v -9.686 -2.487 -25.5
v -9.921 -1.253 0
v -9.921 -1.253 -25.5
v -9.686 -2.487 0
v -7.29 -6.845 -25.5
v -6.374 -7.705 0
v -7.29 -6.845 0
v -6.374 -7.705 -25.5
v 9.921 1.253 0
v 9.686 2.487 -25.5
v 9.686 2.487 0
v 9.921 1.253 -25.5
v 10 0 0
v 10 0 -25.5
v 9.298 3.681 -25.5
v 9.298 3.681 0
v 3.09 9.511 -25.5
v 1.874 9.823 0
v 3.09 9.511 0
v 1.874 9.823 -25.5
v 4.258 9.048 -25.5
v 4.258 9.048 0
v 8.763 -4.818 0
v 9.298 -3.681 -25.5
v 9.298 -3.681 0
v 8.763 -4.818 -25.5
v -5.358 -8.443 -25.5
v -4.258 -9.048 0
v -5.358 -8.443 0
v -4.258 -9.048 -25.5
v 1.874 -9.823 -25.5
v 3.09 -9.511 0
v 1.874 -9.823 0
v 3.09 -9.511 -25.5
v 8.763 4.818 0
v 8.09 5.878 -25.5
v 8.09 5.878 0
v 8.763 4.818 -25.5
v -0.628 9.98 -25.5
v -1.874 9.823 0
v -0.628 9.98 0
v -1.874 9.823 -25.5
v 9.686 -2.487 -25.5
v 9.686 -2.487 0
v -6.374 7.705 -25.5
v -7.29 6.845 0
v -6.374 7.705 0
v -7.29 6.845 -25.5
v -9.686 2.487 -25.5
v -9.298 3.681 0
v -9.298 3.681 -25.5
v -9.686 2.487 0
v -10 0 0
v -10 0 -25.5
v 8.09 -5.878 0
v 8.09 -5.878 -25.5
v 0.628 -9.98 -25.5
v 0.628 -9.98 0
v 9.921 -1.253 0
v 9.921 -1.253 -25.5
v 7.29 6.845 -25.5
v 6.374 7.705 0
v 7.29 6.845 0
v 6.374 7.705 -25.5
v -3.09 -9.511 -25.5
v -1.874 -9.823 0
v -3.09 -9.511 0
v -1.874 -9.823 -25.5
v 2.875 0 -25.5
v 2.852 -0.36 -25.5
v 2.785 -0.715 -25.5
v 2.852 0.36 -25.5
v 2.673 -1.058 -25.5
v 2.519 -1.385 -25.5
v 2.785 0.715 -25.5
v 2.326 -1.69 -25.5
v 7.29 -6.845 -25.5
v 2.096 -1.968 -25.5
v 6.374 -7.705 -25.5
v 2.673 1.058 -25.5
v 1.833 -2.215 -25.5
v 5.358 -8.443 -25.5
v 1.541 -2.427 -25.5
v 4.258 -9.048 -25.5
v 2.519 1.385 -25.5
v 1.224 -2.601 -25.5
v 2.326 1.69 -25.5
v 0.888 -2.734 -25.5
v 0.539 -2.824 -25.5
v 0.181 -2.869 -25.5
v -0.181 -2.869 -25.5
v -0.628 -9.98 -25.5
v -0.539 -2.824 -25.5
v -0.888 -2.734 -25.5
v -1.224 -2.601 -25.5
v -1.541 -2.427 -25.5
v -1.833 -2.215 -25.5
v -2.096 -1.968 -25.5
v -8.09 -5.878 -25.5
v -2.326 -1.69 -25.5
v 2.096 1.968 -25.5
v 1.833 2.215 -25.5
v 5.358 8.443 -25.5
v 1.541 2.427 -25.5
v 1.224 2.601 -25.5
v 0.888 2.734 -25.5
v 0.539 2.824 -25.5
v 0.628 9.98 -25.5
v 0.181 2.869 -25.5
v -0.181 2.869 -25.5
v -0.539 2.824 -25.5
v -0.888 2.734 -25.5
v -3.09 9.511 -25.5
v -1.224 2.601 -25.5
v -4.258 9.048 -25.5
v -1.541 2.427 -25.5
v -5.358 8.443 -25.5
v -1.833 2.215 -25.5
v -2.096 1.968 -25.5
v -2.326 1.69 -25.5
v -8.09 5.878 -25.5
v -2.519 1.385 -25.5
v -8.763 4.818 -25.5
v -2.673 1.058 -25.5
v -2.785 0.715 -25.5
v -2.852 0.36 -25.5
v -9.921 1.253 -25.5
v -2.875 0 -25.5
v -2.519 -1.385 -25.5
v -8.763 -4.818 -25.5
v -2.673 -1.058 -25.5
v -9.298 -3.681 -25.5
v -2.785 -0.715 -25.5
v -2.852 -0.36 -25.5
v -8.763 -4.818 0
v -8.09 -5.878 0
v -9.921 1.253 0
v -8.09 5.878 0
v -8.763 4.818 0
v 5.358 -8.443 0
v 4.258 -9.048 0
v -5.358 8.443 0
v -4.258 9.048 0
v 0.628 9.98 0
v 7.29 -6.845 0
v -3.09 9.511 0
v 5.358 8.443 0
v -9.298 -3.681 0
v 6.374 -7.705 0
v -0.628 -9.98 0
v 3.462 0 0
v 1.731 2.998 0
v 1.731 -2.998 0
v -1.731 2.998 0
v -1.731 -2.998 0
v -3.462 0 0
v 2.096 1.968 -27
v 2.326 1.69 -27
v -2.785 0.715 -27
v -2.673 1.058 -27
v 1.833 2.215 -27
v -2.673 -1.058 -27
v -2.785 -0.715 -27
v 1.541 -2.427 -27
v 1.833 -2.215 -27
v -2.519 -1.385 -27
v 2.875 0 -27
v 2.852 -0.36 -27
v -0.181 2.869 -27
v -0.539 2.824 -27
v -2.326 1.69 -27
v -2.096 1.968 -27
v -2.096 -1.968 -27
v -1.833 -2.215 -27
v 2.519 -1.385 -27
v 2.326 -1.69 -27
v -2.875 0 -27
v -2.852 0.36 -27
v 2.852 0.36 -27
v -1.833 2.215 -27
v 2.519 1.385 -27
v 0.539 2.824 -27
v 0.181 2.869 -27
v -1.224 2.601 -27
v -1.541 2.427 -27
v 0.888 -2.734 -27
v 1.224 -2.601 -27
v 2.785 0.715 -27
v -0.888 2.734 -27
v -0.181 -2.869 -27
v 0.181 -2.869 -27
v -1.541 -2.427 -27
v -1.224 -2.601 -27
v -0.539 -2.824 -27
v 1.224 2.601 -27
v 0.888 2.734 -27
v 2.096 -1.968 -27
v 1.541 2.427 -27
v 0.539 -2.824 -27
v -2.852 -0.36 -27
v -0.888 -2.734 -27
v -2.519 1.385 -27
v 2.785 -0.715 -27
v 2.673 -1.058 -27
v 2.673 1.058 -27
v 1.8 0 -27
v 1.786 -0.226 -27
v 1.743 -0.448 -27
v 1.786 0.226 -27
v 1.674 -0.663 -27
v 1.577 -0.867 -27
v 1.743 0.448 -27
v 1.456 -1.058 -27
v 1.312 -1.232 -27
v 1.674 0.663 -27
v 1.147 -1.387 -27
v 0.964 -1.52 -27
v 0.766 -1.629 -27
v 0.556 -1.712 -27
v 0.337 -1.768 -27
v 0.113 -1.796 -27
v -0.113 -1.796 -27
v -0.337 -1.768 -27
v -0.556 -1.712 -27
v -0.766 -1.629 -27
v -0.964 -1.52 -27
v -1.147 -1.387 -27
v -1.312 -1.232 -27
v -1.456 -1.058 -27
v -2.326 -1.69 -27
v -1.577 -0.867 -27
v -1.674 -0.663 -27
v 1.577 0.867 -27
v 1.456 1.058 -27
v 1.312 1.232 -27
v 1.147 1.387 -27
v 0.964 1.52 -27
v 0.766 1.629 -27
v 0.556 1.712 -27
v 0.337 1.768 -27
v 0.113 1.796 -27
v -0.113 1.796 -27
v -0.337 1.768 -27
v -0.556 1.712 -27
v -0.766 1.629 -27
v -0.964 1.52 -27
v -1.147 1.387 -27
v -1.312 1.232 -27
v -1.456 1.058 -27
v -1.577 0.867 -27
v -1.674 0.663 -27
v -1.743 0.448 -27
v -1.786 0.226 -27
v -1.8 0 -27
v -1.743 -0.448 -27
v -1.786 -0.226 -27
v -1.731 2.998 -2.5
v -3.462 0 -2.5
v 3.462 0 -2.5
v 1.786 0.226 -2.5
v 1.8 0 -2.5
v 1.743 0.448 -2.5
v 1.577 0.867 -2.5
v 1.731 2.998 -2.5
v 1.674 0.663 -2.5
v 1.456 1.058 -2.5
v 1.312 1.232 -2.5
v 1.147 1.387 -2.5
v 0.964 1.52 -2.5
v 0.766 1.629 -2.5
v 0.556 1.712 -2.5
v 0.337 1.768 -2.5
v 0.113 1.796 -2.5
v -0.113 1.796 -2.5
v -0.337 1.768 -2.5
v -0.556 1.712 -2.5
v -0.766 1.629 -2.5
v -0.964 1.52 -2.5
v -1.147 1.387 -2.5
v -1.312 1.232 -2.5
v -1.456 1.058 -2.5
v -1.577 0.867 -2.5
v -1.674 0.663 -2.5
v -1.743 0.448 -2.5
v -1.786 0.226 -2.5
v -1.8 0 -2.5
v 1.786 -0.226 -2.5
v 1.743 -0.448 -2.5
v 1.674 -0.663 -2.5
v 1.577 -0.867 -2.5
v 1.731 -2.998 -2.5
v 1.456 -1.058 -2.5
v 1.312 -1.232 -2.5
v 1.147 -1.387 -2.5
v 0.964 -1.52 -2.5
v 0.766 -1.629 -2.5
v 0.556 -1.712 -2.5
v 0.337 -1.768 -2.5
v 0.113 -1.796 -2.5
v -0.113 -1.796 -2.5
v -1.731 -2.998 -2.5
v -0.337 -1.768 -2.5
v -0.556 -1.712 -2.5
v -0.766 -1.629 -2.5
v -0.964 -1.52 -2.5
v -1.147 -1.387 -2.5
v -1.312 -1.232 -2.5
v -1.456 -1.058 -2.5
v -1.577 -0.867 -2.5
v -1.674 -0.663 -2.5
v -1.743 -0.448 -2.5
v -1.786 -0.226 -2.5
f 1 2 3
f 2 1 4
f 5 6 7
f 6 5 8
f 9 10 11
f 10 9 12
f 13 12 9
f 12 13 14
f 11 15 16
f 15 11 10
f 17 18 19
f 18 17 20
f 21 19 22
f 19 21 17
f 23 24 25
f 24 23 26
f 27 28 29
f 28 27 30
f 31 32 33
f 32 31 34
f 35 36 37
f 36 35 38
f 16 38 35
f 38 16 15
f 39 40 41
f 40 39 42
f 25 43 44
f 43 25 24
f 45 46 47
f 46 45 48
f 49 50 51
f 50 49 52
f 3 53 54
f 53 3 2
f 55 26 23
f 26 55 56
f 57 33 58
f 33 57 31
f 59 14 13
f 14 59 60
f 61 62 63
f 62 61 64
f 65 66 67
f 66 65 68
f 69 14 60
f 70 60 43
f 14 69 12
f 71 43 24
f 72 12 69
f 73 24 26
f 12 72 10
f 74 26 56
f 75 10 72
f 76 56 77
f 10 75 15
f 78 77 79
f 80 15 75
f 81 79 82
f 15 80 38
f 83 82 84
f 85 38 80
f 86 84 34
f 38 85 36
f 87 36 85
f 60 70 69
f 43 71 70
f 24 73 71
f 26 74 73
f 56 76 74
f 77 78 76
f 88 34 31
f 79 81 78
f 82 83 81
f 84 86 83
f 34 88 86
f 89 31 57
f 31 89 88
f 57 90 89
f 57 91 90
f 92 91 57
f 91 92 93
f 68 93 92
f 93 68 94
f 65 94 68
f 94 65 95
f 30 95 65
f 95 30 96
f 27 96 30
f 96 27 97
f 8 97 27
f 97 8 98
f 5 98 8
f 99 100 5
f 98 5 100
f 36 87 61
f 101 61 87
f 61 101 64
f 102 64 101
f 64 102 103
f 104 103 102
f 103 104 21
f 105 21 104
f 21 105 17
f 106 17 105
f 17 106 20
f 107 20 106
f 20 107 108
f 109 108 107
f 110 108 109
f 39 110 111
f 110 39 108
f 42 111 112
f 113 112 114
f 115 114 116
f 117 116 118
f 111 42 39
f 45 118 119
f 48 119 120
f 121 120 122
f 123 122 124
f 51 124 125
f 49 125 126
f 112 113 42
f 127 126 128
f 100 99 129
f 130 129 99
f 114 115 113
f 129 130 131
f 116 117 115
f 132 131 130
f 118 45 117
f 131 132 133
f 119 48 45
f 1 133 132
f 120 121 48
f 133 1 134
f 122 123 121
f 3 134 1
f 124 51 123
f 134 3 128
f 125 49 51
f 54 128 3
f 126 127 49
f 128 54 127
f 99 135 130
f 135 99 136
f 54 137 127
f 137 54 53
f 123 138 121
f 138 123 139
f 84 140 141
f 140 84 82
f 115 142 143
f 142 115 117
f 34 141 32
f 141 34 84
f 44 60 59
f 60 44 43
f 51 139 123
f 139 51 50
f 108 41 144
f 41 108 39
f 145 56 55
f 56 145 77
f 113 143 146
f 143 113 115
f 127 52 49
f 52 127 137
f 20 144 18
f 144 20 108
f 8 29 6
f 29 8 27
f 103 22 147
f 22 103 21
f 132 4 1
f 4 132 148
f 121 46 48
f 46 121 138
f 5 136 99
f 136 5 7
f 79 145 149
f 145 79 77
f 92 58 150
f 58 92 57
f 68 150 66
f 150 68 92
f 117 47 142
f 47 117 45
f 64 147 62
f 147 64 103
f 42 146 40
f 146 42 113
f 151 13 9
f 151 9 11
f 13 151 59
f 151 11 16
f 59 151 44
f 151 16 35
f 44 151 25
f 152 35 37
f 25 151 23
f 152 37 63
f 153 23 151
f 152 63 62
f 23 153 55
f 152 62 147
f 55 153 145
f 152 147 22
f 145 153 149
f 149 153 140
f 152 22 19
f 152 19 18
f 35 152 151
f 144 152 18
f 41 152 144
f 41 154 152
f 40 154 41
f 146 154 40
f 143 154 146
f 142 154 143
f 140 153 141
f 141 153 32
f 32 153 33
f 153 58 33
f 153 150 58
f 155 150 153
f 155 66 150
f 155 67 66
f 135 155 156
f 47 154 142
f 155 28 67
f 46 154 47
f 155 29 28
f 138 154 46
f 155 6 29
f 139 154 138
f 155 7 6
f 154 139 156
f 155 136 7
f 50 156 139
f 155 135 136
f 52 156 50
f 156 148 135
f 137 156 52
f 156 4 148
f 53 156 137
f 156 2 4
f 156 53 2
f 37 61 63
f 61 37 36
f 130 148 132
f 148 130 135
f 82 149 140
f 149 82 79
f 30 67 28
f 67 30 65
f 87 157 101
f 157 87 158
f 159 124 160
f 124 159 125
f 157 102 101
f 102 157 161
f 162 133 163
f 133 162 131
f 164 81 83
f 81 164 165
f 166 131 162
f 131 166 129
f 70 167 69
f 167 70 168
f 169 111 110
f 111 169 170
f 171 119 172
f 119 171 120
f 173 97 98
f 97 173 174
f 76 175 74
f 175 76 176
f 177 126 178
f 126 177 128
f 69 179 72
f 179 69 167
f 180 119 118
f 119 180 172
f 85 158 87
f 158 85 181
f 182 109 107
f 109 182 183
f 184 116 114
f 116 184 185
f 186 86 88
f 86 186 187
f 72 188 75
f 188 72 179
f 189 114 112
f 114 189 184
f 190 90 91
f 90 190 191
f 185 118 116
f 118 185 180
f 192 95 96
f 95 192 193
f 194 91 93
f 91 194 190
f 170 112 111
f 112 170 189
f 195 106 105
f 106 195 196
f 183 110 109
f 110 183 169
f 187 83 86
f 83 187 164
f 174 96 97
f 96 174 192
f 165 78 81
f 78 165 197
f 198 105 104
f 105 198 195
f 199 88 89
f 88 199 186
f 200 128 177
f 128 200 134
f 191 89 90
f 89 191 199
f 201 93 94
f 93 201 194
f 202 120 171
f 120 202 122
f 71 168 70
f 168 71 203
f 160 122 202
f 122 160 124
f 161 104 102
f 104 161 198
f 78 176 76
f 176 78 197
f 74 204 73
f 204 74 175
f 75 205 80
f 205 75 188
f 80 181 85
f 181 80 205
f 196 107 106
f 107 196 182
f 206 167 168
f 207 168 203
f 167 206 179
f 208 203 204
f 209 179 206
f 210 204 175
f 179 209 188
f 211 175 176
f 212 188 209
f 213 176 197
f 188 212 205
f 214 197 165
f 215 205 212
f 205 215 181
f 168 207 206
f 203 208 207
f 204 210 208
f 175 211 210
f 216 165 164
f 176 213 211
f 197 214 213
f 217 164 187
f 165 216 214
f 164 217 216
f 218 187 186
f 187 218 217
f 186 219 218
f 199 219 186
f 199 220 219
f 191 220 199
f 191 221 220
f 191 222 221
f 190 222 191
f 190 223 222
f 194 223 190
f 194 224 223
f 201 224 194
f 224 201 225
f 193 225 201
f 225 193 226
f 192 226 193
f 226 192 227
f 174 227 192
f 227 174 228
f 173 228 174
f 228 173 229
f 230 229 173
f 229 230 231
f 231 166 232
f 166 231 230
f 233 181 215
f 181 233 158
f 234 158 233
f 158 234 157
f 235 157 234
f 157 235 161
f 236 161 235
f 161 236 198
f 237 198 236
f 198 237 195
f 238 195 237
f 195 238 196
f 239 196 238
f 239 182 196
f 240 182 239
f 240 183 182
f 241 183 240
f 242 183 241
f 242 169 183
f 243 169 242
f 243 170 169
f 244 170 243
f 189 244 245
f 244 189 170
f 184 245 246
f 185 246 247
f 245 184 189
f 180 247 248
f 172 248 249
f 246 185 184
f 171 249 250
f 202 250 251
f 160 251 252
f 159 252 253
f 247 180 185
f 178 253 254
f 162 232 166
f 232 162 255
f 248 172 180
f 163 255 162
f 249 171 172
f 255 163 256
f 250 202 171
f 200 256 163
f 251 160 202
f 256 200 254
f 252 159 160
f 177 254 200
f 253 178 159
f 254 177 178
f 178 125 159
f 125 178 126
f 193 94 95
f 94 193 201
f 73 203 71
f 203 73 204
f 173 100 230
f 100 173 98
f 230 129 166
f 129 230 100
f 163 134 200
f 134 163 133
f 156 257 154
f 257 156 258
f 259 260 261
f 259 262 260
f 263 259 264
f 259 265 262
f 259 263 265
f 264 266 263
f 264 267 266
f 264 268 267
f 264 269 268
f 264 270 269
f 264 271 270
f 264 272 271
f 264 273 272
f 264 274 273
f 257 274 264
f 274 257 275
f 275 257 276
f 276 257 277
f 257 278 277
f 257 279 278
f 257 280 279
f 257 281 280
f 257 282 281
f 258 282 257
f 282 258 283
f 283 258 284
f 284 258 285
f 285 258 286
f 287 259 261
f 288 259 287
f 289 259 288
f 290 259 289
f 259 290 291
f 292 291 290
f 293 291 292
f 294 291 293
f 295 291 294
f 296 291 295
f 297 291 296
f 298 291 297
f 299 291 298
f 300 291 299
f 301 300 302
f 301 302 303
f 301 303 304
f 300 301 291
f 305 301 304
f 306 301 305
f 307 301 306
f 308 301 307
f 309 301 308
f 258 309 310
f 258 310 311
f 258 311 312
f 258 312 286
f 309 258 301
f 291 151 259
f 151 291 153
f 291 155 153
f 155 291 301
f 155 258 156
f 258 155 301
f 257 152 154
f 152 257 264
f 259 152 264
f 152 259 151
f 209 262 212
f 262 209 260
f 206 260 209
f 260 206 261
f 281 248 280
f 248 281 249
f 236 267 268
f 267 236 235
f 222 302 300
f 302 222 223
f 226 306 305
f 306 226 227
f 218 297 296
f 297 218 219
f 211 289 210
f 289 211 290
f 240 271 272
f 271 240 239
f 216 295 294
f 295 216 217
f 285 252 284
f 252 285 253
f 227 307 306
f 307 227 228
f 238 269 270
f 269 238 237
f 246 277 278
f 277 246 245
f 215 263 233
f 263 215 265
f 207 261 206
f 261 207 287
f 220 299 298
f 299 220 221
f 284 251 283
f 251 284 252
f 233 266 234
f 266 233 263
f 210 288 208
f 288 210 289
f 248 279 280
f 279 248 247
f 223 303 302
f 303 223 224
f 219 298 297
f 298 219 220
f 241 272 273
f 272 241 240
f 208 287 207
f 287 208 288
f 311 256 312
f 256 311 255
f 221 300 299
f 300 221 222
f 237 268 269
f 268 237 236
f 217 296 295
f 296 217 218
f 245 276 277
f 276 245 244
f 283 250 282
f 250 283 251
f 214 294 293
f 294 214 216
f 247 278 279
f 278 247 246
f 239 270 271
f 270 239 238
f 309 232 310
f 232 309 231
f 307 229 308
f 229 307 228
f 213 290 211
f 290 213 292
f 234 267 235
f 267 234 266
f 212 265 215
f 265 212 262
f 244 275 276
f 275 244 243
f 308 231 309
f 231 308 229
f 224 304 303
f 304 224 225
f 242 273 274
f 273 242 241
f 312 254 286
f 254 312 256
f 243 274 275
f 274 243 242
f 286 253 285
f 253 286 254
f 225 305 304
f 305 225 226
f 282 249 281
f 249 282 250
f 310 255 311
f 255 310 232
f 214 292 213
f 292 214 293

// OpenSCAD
$fn = 50;

difference() {
	union() {
		translate(v = [0, 0, -25.5]) {
			cylinder(h = 25.5, r = 10.0);
		}
		#translate(v = [0, 0, -27.0]) {
			cylinder(h = 27, r = 2.875);
		}
	}
	union() {
		translate(v = [0, 0, 0]) {
			rotate(a = [0, 0, 0]) {
				difference() {
					union() {
						translate(v = [0, 0, -2.5]) {
							linear_extrude(height = 2.5) {
								polygon(points = [[3.4619999999999997, 0.0], [1.7310000000000003, 2.9981799479017264], [-1.7309999999999992, 2.9981799479017264], [-3.4619999999999997, 4.2397272186481365e-16], [-1.7310000000000014, -2.998179947901726], [1.7309999999999977, -2.9981799479017277]]);
							}
						}
					}
					union();
				}
			}
		}
		#translate(v = [0, 0, -100.0]) {
			cylinder(h = 200, r = 1.8);
		}
	}
}
